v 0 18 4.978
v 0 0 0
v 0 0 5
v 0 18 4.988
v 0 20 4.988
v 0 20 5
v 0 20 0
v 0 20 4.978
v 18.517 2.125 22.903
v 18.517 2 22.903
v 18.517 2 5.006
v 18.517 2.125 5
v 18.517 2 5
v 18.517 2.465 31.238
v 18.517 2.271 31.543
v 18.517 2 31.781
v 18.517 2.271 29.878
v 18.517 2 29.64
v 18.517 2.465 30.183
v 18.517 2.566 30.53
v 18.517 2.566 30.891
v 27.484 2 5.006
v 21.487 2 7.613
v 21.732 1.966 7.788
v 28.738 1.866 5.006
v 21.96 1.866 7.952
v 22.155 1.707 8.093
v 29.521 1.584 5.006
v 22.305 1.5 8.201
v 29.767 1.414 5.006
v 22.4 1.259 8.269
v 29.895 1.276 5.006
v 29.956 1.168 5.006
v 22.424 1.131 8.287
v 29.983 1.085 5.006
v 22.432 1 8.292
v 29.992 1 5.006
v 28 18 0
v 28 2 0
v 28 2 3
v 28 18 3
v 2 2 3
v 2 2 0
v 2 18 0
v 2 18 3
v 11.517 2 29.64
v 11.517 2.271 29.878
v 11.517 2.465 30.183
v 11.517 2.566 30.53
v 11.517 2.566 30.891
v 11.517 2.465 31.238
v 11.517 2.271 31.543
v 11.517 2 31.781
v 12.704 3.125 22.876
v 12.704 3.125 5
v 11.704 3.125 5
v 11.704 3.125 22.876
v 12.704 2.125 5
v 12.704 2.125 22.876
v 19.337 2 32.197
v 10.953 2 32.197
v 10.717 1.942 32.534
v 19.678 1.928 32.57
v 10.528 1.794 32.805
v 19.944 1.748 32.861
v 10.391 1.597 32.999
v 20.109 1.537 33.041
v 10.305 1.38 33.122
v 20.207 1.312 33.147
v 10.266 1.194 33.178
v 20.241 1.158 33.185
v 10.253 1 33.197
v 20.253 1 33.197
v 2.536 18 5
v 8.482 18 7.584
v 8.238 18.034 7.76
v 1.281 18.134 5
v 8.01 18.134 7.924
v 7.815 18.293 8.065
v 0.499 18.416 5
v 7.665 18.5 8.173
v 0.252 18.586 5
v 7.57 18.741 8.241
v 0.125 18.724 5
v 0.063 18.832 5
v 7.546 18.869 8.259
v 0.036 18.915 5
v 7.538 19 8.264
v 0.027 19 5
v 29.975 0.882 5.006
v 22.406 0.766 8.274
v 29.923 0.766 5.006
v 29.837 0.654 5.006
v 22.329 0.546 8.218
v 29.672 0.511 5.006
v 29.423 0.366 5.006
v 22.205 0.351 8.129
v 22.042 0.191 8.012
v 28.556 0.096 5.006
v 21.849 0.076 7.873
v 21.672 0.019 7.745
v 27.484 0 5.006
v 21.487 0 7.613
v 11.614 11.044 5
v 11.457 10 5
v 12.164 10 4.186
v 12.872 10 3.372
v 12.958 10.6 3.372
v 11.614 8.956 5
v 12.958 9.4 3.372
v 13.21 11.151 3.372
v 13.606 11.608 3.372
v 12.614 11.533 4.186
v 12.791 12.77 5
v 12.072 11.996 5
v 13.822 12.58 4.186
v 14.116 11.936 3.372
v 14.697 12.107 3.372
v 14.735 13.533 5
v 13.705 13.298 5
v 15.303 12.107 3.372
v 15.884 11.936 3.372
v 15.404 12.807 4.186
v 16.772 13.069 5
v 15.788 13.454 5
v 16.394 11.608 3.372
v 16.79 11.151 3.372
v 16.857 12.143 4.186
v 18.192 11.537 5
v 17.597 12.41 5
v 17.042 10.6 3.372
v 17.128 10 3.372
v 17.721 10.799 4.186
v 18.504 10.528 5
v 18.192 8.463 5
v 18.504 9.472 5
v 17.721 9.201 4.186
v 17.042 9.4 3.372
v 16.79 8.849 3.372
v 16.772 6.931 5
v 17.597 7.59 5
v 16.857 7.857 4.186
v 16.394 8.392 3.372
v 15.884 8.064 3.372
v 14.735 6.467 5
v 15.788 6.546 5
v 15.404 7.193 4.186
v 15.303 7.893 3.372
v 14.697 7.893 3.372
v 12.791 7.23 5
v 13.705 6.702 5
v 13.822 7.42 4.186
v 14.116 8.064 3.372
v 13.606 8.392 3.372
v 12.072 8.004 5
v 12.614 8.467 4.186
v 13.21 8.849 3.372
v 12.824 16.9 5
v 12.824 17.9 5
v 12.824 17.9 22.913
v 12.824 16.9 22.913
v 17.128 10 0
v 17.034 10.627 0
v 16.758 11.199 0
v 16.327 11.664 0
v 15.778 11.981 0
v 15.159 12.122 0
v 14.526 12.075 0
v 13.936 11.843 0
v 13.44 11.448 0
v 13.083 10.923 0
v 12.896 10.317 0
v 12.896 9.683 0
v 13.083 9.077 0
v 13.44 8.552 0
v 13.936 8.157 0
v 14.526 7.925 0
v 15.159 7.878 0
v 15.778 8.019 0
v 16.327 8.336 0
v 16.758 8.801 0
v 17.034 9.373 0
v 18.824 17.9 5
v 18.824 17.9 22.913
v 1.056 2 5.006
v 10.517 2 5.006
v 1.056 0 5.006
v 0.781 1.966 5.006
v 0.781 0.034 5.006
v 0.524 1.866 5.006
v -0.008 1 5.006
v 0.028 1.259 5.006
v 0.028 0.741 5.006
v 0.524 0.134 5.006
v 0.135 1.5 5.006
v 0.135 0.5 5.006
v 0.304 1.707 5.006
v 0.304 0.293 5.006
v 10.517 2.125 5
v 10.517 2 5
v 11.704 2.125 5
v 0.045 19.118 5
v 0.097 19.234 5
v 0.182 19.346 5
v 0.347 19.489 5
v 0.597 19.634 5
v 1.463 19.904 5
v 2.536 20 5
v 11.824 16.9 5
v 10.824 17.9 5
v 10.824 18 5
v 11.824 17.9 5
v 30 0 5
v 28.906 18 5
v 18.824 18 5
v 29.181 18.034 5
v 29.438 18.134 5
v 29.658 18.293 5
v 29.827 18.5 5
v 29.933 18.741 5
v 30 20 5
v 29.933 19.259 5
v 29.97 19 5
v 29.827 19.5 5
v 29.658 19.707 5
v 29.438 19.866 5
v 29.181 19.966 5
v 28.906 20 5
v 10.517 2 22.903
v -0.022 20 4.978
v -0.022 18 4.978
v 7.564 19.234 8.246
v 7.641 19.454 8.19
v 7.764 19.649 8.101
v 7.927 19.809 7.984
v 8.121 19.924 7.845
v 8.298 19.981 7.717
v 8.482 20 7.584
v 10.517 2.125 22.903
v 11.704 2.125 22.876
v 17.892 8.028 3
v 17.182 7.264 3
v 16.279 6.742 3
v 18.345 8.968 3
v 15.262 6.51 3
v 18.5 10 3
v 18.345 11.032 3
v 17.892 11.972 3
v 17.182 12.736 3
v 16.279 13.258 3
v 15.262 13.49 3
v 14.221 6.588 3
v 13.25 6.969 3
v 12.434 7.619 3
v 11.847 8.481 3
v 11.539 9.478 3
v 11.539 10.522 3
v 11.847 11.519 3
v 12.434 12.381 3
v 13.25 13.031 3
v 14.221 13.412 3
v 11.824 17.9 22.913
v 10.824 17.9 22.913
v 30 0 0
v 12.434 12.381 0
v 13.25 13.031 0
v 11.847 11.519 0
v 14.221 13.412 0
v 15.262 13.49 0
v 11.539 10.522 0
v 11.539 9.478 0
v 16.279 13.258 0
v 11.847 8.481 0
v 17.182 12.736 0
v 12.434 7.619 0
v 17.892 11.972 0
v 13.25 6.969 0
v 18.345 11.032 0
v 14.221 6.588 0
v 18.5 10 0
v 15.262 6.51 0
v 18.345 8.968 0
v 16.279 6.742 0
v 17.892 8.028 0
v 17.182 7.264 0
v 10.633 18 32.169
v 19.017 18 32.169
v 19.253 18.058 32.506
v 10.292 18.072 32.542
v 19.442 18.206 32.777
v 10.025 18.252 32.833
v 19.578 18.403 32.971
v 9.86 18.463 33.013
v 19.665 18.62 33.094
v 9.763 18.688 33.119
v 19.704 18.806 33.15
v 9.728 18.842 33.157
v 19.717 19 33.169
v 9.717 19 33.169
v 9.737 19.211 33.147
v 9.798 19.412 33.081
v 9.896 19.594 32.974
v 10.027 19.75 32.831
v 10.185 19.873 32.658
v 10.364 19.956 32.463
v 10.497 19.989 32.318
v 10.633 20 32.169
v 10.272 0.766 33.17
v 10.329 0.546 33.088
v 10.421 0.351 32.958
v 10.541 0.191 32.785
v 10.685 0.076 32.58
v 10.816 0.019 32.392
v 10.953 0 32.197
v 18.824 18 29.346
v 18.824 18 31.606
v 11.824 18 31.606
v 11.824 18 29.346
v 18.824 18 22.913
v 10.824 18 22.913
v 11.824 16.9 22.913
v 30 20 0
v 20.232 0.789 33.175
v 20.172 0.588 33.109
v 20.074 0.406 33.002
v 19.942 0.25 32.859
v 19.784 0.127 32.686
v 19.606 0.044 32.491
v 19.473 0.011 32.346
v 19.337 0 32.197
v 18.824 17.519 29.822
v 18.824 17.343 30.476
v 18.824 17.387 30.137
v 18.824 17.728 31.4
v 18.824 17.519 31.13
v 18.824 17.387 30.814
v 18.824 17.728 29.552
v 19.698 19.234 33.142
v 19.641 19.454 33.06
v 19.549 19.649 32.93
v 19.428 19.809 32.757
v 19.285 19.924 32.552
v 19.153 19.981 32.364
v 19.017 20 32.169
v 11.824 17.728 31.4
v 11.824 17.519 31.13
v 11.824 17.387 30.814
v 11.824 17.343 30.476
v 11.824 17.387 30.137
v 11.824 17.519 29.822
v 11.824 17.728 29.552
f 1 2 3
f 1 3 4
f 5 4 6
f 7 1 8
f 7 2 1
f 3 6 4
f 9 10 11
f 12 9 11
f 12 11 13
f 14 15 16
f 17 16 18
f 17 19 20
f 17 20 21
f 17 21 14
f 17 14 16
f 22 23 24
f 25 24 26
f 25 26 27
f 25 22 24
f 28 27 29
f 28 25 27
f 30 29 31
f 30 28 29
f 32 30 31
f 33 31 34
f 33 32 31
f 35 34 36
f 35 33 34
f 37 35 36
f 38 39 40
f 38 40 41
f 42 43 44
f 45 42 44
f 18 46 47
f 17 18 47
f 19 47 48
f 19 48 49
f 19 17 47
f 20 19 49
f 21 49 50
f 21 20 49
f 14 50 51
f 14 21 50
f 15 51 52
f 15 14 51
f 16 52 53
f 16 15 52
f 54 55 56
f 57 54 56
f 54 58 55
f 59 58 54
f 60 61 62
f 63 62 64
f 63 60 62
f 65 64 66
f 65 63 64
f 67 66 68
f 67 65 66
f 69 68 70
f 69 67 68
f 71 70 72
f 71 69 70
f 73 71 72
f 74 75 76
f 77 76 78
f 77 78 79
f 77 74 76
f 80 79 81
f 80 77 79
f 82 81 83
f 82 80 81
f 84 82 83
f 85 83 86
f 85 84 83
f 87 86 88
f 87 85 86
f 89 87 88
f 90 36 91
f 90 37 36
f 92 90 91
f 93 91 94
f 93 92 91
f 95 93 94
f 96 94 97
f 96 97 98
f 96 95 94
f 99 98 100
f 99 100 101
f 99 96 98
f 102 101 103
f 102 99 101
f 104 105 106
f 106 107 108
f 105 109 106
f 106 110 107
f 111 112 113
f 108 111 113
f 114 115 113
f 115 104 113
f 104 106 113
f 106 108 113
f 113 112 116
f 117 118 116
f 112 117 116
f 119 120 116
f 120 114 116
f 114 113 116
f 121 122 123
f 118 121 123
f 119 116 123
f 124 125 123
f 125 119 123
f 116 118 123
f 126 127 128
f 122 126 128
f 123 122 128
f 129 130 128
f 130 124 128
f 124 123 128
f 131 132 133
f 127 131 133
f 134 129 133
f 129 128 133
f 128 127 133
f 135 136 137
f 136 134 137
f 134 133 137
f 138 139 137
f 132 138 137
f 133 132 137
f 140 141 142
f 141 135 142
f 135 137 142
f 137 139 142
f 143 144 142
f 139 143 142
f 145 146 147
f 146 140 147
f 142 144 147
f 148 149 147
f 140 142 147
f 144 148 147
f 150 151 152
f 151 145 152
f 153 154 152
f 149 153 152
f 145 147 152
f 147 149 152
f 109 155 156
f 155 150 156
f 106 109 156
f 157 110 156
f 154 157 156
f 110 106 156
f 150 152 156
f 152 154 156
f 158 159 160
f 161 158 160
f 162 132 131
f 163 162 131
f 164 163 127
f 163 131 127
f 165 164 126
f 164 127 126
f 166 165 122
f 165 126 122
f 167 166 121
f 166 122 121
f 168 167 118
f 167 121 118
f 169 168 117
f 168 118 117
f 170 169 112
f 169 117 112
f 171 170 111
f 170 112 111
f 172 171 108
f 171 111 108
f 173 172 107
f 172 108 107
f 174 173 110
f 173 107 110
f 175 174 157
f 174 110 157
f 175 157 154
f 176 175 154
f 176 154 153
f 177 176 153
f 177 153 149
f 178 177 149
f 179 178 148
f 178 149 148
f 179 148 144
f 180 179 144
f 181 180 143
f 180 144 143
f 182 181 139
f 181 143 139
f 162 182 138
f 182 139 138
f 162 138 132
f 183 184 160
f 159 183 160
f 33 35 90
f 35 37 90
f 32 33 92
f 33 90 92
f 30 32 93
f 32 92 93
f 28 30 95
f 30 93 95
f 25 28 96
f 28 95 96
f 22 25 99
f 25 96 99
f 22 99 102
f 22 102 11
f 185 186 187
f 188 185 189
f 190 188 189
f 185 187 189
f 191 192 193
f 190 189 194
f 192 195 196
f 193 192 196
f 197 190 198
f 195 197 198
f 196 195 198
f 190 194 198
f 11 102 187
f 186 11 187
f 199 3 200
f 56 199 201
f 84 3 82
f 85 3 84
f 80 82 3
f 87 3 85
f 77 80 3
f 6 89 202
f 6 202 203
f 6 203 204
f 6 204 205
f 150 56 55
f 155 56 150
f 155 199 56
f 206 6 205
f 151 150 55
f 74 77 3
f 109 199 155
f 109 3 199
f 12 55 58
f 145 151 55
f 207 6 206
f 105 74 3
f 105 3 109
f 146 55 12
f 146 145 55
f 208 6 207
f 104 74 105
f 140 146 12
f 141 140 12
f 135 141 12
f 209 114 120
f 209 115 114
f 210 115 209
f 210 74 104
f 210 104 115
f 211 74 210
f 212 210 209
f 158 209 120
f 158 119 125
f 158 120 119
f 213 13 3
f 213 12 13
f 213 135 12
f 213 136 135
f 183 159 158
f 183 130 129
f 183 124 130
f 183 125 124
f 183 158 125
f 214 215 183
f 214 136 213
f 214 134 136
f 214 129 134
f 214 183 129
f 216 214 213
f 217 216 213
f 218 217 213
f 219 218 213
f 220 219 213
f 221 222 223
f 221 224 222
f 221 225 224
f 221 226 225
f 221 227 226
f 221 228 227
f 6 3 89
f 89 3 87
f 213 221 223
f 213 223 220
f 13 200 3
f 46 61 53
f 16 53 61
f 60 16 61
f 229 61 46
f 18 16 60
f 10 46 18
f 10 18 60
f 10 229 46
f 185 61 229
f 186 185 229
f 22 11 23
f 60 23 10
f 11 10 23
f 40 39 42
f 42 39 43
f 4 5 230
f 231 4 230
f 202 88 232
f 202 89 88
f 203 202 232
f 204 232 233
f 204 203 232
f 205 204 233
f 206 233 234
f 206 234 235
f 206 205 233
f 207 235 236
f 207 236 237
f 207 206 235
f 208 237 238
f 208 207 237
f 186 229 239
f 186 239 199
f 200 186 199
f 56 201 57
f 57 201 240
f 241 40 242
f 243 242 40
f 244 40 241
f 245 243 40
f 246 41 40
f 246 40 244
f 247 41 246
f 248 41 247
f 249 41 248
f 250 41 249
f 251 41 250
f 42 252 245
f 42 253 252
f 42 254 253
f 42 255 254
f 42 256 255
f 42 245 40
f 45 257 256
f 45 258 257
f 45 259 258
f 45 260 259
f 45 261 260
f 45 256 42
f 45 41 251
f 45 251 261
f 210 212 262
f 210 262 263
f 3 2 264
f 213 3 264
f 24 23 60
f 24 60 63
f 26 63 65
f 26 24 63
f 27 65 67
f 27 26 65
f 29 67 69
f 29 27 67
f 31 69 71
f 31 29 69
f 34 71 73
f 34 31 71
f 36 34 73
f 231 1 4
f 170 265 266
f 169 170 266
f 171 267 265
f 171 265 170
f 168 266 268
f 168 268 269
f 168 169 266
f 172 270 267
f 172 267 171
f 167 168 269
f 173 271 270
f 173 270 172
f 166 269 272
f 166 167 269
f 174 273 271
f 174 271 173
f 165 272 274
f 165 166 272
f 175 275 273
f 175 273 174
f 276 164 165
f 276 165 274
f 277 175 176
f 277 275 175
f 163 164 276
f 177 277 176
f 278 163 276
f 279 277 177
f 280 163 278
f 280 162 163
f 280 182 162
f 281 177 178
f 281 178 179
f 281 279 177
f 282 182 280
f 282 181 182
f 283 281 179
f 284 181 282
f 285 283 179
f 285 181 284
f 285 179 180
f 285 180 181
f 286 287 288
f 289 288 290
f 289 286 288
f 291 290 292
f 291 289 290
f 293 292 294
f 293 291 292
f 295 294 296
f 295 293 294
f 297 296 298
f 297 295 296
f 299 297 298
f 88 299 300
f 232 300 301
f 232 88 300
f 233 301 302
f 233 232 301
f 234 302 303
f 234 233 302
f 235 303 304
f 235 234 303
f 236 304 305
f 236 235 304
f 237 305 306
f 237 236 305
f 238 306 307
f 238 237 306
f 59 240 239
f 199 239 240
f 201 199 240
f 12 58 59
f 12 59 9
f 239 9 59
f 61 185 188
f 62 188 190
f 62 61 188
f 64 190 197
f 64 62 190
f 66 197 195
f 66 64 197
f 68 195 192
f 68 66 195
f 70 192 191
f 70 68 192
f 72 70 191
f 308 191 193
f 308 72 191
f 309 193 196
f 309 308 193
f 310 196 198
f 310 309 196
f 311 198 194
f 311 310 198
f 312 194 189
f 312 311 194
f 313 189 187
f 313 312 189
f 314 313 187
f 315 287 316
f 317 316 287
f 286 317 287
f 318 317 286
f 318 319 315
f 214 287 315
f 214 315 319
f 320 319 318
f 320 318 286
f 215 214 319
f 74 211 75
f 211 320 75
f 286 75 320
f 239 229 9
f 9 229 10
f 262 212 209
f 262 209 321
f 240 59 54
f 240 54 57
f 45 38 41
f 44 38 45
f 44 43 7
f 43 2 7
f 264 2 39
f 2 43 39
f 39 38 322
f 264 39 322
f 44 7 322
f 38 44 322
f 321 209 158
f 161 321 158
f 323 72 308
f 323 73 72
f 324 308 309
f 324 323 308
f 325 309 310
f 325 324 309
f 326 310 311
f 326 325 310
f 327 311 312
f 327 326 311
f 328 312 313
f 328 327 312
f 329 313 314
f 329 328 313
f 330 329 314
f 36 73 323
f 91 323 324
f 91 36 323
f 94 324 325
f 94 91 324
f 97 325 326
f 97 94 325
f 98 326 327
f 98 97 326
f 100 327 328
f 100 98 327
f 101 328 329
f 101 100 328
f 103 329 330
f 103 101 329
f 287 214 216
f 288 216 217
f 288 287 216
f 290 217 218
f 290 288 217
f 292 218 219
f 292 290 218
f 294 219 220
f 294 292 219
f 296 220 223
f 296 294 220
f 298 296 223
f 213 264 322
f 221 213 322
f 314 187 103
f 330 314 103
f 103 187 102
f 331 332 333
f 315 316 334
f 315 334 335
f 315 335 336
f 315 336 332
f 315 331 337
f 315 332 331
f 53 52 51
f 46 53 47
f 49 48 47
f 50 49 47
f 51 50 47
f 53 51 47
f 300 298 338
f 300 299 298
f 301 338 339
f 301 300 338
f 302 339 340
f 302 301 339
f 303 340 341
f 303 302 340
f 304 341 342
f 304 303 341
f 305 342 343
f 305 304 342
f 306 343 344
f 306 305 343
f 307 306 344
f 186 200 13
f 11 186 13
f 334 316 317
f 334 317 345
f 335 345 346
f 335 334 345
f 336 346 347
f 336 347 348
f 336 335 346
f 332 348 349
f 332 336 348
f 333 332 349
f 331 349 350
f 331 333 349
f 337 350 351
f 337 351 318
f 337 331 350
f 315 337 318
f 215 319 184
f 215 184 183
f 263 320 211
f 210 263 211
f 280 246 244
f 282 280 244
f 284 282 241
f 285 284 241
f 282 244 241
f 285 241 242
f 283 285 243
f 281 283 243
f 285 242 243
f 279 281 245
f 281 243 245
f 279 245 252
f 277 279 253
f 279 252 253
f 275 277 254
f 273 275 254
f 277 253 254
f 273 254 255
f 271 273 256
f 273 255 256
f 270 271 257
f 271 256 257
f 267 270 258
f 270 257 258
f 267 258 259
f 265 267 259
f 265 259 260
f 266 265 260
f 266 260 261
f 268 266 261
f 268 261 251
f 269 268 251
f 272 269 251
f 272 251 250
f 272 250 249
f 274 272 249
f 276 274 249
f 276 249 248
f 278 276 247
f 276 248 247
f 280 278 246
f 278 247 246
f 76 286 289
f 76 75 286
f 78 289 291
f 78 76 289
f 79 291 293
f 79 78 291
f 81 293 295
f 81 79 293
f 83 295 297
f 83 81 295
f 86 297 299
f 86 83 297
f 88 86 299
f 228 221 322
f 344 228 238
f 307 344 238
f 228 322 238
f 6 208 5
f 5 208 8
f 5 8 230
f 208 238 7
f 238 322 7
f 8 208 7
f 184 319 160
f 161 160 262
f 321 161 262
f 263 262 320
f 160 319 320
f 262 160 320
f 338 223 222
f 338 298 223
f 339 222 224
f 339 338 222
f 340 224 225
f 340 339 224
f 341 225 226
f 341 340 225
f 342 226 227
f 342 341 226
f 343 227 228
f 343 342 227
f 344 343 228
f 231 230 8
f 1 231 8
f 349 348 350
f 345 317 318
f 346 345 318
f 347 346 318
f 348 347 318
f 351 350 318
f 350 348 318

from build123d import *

# Parameters (mm, degrees)
ESQUISSE1_W                                       = 10
ESQUISSE1_H                                       = 20
ESQUISSE1_W_2                                     = 20
BOSS_EXTRU_3_DEPTH                                = 5
BOSS_EXTRU_5_DEPTH                                = 2
ESQUISSE15_W                                      = 8
ESQUISSE15_H                                      = 17.913431031
BOSS_EXTRU_6_DEPTH                                = 0.1
ESQUISSE16_W                                      = 1
ESQUISSE16_H                                      = 17.913431031
BOSS_EXTRU_7_DEPTH                                = 1
BOSS_EXTRU_11_DEPTH                               = 2
ESQUISSE32_W                                      = 8
ESQUISSE32_H                                      = 17.913431031
BOSS_EXTRU_14_DEPTH                               = 0.125
ESQUISSE42_R                                      = 1.279103286
BOSS_EXTRU_18_DEPTH                               = 7
ESQUISSE56_R                                      = 1.3
BOSS_EXTRU_20_DEPTH                               = 7
CONG_4_R                                          = 1
ESQUISSE33_W                                      = 1
ESQUISSE33_H                                      = 17.913431031
BOSS_EXTRU_15_DEPTH                               = 1
ESQUISSE35_R                                      = 2.128247198
ENL_V_MAT_EXTRU_1_DEPTH                           = 5
ESQUISSE37_W                                      = 26
ESQUISSE37_H                                      = 16
ENL_V_MAT_EXTRU_2_DEPTH                           = 3
ESQUISSE38_R                                      = 3.5
BOSS_EXTRU_17_DEPTH                               = 3
ESQUISSE35_3_R                                    = 2.128247198
ENL_V_MAT_EXTRU_3_DEPTH                           = 5
FRAISAGE_POUR_VIS_T_TE_FRAIS_E_BOMB_E_D           = 3.7973
FRAISAGE_POUR_VIS_T_TE_FRAIS_E_BOMB_E_CSINK_D     = 7.0866
FRAISAGE_POUR_VIS_T_TE_FRAIS_E_BOMB_E_CSINK_ANGLE = 82


with BuildPart() as part:
    # Esquisse1 → Boss.-Extru.3 (new body)
    with BuildSketch(Plane.XY):
        with Locations((25, 10)):
            Rectangle(ESQUISSE1_W, ESQUISSE1_H)
        with Locations((10, 10)):
            Rectangle(ESQUISSE1_W_2, ESQUISSE1_H)
    extrude(amount=BOSS_EXTRU_3_DEPTH)

    # Esquisse14 → Boss.-Extru.5 (add)
    with BuildSketch(Plane(origin=(0, 20, 0), x_dir=(1, 0, 0), z_dir=(0, 1, 0))):
        Polygon((29.977520524, -4.978412673), (19.716916224, -33.169191296), (9.716916224, -33.169191296), (7.538022655, -8.264323844), (-0.022479476, -4.978412673), align=None)
    extrude(amount=-BOSS_EXTRU_5_DEPTH)

    # Esquisse15 → Boss.-Extru.6 (add)
    with BuildSketch(Plane(origin=(0, 18, 0), x_dir=(-1, 0, 0), z_dir=(0, -1, 0))):
        with Locations((-14.823599663, -13.956715516)):
            Rectangle(ESQUISSE15_W, ESQUISSE15_H)
    extrude(amount=BOSS_EXTRU_6_DEPTH)

    # Esquisse16 → Boss.-Extru.7 (add)
    with BuildSketch(Plane.XZ.offset(-17.9)):
        with Locations((12.323594191, 13.956715516)):
            Rectangle(ESQUISSE16_W, ESQUISSE16_H)
    extrude(amount=BOSS_EXTRU_7_DEPTH)



with BuildPart() as body_2:
    # Esquisse20 → Boss.-Extru.11 (new body)
    with BuildSketch(Plane(origin=(0, 0, 0), x_dir=(-1, 0, 0), z_dir=(0, -1, 0))):
        Polygon((0.007816785, -5.006477186), (-10.252787515, -33.19725581), (-20.252787515, -33.19725581), (-22.431681083, -8.292388358), (-29.992183215, -5.006477186), align=None)
    extrude(amount=-BOSS_EXTRU_11_DEPTH)


with BuildPart() as part_1:
    add(part.part)

    add(body_2.part)  # Boss.-Extru.14 merges body 2
    # Esquisse32 → Boss.-Extru.14 (add)
    with BuildSketch(Plane(origin=(0, 2, 0), x_dir=(1, 0, 0), z_dir=(0, 1, 0))):
        with Locations((14.516805055, -13.946251691)):
            Rectangle(ESQUISSE32_W, ESQUISSE32_H)
    extrude(amount=BOSS_EXTRU_14_DEPTH)

    # Esquisse42 → Boss.-Extru.18 (add)
    with BuildSketch(Plane(origin=(18.516805055, 0, 0), x_dir=(0, 0, -1), z_dir=(1, 0, 0))):
        with Locations((-30.710413968, 1.3)):
            Circle(ESQUISSE42_R)
    extrude(amount=-BOSS_EXTRU_18_DEPTH)

    # Esquisse56 → Boss.-Extru.20 (add)
    with BuildSketch(Plane(origin=(18.823599663, 0, 0), x_dir=(0, 0, -1), z_dir=(1, 0, 0))):
        with Locations((-30.475906609, 18.642606084)):
            Circle(ESQUISSE56_R)
    extrude(amount=-BOSS_EXTRU_20_DEPTH)

    # Congé4
    cong_4_edges = [part_1.edges().sort_by_distance(p)[0] for p in [
        (5.122485365, 2, 19.101866498),
        (5.122485365, 0, 19.101866498),
        (15.252787515, 0, 33.19725581),
        (15.252787515, 2, 33.19725581),
        (21.342234299, 2, 20.744822084),
        (21.342234299, 0, 20.744822084),
        (26.211932149, 2, 6.649432772),
        (26.211932149, 0, 6.649432772),
        (3.782606563, 18, 6.632161922),
        (3.782606563, 20, 6.632161922),
        (8.62746944, 18, 20.71675757),
        (8.62746944, 20, 20.71675757),
        (14.716916224, 18, 33.169191296),
        (14.716916224, 20, 33.169191296),
        (24.843289802, 18, 19.084595648),
        (24.843289802, 20, 19.084595648),
    ]]
    fillet(cong_4_edges, radius=CONG_4_R - 0.0001)  # a hair under: the kernel refuses the full size

    # Esquisse33 → Boss.-Extru.15 (add)
    with BuildSketch(Plane(origin=(0, 2.125, 0), x_dir=(-1, 0, 0), z_dir=(0, 1, 0))):
        with Locations((-12.203810405, 13.919189864)):
            Rectangle(ESQUISSE33_W, ESQUISSE33_H)
    extrude(amount=BOSS_EXTRU_15_DEPTH)

    # Esquisse35 → Enlèv. mat.-Extru.1 (cut)
    with BuildSketch(Plane.XY.offset(5)):
        with Locations((15, 10)):
            Circle(ESQUISSE35_R)
    extrude(amount=-ENL_V_MAT_EXTRU_1_DEPTH, mode=Mode.SUBTRACT)

    # Esquisse37 → Enlèv. mat.-Extru.2 (cut)
    with BuildSketch(Plane(origin=(0, 0, 0), x_dir=(-1, 0, 0), z_dir=(0, 0, -1))):
        with Locations((-15, 10)):
            Rectangle(ESQUISSE37_W, ESQUISSE37_H)
    extrude(amount=-ENL_V_MAT_EXTRU_2_DEPTH, mode=Mode.SUBTRACT)

    # Esquisse38 → Boss.-Extru.17 (add)
    with BuildSketch(Plane(origin=(0, 0, 3), x_dir=(-1, 0, 0), z_dir=(0, 0, -1))):
        with Locations(Location((-15, 10, 0), (0, 0, 180))):
            Circle(ESQUISSE38_R)
    extrude(amount=BOSS_EXTRU_17_DEPTH)

    # Esquisse35<3> → Enlèv. mat.-Extru.3 (cut)
    with BuildSketch(Plane.XY.offset(5)):
        with Locations((15, 10)):
            Circle(ESQUISSE35_3_R)
    extrude(amount=-ENL_V_MAT_EXTRU_3_DEPTH, mode=Mode.SUBTRACT)

    # Fraisage pour vis à tête fraisée bombée #61 (through all)
    with Locations(Plane.XY.offset(5)):
        with Locations((15, 10)):
            CounterSinkHole(FRAISAGE_POUR_VIS_T_TE_FRAIS_E_BOMB_E_D / 2, FRAISAGE_POUR_VIS_T_TE_FRAIS_E_BOMB_E_CSINK_D / 2, counter_sink_angle=FRAISAGE_POUR_VIS_T_TE_FRAIS_E_BOMB_E_CSINK_ANGLE)


solid = part_1.part
